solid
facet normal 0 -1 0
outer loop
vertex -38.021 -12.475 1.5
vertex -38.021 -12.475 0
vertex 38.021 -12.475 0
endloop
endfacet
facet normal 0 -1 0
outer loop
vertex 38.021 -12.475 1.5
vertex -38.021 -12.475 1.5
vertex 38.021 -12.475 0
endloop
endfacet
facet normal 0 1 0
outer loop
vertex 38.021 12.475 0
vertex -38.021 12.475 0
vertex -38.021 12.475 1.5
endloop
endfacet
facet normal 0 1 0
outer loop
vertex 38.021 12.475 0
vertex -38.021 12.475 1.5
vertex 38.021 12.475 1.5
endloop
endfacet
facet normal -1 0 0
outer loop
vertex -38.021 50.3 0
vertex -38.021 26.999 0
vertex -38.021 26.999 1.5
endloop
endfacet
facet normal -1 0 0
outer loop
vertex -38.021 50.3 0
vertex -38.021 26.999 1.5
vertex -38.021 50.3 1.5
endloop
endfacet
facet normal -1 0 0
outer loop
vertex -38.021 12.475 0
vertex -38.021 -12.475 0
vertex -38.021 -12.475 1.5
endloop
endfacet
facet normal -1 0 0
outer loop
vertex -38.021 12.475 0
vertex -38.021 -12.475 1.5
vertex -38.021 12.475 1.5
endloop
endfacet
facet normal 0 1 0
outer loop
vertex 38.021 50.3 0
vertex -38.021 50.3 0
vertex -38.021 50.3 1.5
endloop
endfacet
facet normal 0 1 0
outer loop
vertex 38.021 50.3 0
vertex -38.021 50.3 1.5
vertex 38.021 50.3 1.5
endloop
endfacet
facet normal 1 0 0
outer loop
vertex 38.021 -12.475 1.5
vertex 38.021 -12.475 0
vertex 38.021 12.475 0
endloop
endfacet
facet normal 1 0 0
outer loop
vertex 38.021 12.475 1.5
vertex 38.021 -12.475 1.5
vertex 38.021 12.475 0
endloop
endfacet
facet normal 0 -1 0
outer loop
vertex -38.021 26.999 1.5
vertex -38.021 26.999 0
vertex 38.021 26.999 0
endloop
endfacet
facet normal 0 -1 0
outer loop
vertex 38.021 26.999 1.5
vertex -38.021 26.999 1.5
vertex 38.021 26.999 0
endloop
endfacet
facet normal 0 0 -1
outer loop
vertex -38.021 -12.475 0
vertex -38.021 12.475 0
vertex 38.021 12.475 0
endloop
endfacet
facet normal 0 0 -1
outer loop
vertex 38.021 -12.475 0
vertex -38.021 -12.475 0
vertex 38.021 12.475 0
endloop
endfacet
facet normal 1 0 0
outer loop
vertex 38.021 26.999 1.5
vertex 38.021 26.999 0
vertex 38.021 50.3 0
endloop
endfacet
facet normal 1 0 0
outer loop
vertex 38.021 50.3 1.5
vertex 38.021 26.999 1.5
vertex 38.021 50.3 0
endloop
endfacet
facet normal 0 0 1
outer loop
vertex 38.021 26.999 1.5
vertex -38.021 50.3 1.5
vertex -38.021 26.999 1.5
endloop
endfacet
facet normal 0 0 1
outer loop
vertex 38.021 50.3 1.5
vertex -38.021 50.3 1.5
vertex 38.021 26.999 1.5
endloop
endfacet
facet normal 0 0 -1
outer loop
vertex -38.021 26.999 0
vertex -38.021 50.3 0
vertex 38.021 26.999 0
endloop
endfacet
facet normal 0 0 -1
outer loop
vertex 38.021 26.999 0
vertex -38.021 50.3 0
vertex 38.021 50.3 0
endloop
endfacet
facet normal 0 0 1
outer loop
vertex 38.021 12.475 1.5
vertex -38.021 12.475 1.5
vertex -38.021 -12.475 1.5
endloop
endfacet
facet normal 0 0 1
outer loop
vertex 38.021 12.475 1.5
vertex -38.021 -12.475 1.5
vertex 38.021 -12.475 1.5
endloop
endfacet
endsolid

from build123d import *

# Parameters (mm, degrees)
F0_W     = 76.042794
F0_H     = 23.30175
F0_H_2   = 24.949654
F1_DEPTH = 1.5


with BuildPart() as f1:
    # F0 (on Top) → F1 (new body)
    with BuildSketch(Plane.XY):
        with Locations((0, 38.649395)):
            Rectangle(F0_W, F0_H)
        Rectangle(F0_W, F0_H_2)
    extrude(amount=F1_DEPTH)


solid = f1.part
